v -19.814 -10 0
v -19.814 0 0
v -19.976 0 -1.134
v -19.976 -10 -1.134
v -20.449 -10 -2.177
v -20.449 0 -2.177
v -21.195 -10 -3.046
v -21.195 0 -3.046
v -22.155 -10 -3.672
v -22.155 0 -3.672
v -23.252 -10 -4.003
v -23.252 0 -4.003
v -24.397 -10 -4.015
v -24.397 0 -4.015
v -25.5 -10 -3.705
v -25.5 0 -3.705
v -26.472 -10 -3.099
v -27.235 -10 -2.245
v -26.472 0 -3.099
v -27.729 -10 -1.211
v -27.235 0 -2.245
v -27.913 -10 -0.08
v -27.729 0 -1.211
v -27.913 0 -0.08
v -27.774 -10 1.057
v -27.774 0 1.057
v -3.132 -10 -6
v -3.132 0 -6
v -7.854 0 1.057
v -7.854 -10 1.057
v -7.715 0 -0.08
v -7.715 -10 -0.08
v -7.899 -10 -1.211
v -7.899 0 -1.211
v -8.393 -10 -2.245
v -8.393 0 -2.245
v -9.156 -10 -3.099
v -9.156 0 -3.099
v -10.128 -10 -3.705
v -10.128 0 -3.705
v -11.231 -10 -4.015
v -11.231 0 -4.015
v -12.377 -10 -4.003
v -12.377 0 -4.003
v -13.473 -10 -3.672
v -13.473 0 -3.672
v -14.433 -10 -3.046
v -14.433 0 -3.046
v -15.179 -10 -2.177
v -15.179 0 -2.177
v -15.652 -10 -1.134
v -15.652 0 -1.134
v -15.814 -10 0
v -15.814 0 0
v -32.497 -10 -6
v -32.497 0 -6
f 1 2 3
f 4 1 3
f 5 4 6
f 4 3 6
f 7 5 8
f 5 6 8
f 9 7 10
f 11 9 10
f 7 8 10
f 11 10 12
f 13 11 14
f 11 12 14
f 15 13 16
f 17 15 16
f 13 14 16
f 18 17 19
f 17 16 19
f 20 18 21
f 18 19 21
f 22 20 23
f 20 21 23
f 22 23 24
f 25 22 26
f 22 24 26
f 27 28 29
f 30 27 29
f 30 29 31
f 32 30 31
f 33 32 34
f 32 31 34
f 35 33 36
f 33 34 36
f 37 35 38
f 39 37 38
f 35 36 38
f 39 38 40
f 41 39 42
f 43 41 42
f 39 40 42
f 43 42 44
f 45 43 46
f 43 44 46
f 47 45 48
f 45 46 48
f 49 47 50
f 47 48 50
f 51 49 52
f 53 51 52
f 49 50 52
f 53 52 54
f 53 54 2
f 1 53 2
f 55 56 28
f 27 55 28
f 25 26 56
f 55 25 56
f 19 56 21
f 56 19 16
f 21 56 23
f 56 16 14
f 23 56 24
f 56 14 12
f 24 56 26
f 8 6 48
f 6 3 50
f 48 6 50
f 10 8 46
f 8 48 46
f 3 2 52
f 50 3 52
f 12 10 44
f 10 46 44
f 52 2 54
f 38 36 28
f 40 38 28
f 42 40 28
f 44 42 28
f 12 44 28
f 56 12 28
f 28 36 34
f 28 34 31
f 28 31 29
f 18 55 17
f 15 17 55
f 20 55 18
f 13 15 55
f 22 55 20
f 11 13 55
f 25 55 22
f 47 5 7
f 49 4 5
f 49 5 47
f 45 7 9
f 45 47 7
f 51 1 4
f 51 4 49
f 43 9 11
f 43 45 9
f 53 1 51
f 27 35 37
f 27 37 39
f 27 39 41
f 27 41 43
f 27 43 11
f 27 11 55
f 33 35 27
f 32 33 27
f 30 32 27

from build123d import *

# Parameters (mm, degrees)
F1_DEPTH = 10


with BuildPart() as f1:
    # F0 (on Front) → F1 (new body)
    with BuildSketch(Plane.XZ):
        with BuildLine():
            ThreePointArc((-19.814088, 0), (-24.397086, -4.014774), (-27.773799, 1.056724))
            Line((-27.773799, 1.056724), (-32.496632, -6))
            Line((-32.496632, -6), (-17.814088, -6))
            Line((-17.814088, -6), (-17.814088, 0))
            Line((-17.814088, 0), (-19.814088, 0))
        make_face()
        with BuildLine():
            Line((-15.814088, 0), (-17.814088, 0))
            Line((-17.814088, 0), (-17.814088, -6))
            Line((-17.814088, -6), (-3.131545, -6))
            Line((-3.131545, -6), (-7.854378, 1.056724))
            ThreePointArc((-7.854378, 1.056724), (-11.231091, -4.014774), (-15.814088, 0))
        make_face()
    extrude(amount=F1_DEPTH)


solid = f1.part
